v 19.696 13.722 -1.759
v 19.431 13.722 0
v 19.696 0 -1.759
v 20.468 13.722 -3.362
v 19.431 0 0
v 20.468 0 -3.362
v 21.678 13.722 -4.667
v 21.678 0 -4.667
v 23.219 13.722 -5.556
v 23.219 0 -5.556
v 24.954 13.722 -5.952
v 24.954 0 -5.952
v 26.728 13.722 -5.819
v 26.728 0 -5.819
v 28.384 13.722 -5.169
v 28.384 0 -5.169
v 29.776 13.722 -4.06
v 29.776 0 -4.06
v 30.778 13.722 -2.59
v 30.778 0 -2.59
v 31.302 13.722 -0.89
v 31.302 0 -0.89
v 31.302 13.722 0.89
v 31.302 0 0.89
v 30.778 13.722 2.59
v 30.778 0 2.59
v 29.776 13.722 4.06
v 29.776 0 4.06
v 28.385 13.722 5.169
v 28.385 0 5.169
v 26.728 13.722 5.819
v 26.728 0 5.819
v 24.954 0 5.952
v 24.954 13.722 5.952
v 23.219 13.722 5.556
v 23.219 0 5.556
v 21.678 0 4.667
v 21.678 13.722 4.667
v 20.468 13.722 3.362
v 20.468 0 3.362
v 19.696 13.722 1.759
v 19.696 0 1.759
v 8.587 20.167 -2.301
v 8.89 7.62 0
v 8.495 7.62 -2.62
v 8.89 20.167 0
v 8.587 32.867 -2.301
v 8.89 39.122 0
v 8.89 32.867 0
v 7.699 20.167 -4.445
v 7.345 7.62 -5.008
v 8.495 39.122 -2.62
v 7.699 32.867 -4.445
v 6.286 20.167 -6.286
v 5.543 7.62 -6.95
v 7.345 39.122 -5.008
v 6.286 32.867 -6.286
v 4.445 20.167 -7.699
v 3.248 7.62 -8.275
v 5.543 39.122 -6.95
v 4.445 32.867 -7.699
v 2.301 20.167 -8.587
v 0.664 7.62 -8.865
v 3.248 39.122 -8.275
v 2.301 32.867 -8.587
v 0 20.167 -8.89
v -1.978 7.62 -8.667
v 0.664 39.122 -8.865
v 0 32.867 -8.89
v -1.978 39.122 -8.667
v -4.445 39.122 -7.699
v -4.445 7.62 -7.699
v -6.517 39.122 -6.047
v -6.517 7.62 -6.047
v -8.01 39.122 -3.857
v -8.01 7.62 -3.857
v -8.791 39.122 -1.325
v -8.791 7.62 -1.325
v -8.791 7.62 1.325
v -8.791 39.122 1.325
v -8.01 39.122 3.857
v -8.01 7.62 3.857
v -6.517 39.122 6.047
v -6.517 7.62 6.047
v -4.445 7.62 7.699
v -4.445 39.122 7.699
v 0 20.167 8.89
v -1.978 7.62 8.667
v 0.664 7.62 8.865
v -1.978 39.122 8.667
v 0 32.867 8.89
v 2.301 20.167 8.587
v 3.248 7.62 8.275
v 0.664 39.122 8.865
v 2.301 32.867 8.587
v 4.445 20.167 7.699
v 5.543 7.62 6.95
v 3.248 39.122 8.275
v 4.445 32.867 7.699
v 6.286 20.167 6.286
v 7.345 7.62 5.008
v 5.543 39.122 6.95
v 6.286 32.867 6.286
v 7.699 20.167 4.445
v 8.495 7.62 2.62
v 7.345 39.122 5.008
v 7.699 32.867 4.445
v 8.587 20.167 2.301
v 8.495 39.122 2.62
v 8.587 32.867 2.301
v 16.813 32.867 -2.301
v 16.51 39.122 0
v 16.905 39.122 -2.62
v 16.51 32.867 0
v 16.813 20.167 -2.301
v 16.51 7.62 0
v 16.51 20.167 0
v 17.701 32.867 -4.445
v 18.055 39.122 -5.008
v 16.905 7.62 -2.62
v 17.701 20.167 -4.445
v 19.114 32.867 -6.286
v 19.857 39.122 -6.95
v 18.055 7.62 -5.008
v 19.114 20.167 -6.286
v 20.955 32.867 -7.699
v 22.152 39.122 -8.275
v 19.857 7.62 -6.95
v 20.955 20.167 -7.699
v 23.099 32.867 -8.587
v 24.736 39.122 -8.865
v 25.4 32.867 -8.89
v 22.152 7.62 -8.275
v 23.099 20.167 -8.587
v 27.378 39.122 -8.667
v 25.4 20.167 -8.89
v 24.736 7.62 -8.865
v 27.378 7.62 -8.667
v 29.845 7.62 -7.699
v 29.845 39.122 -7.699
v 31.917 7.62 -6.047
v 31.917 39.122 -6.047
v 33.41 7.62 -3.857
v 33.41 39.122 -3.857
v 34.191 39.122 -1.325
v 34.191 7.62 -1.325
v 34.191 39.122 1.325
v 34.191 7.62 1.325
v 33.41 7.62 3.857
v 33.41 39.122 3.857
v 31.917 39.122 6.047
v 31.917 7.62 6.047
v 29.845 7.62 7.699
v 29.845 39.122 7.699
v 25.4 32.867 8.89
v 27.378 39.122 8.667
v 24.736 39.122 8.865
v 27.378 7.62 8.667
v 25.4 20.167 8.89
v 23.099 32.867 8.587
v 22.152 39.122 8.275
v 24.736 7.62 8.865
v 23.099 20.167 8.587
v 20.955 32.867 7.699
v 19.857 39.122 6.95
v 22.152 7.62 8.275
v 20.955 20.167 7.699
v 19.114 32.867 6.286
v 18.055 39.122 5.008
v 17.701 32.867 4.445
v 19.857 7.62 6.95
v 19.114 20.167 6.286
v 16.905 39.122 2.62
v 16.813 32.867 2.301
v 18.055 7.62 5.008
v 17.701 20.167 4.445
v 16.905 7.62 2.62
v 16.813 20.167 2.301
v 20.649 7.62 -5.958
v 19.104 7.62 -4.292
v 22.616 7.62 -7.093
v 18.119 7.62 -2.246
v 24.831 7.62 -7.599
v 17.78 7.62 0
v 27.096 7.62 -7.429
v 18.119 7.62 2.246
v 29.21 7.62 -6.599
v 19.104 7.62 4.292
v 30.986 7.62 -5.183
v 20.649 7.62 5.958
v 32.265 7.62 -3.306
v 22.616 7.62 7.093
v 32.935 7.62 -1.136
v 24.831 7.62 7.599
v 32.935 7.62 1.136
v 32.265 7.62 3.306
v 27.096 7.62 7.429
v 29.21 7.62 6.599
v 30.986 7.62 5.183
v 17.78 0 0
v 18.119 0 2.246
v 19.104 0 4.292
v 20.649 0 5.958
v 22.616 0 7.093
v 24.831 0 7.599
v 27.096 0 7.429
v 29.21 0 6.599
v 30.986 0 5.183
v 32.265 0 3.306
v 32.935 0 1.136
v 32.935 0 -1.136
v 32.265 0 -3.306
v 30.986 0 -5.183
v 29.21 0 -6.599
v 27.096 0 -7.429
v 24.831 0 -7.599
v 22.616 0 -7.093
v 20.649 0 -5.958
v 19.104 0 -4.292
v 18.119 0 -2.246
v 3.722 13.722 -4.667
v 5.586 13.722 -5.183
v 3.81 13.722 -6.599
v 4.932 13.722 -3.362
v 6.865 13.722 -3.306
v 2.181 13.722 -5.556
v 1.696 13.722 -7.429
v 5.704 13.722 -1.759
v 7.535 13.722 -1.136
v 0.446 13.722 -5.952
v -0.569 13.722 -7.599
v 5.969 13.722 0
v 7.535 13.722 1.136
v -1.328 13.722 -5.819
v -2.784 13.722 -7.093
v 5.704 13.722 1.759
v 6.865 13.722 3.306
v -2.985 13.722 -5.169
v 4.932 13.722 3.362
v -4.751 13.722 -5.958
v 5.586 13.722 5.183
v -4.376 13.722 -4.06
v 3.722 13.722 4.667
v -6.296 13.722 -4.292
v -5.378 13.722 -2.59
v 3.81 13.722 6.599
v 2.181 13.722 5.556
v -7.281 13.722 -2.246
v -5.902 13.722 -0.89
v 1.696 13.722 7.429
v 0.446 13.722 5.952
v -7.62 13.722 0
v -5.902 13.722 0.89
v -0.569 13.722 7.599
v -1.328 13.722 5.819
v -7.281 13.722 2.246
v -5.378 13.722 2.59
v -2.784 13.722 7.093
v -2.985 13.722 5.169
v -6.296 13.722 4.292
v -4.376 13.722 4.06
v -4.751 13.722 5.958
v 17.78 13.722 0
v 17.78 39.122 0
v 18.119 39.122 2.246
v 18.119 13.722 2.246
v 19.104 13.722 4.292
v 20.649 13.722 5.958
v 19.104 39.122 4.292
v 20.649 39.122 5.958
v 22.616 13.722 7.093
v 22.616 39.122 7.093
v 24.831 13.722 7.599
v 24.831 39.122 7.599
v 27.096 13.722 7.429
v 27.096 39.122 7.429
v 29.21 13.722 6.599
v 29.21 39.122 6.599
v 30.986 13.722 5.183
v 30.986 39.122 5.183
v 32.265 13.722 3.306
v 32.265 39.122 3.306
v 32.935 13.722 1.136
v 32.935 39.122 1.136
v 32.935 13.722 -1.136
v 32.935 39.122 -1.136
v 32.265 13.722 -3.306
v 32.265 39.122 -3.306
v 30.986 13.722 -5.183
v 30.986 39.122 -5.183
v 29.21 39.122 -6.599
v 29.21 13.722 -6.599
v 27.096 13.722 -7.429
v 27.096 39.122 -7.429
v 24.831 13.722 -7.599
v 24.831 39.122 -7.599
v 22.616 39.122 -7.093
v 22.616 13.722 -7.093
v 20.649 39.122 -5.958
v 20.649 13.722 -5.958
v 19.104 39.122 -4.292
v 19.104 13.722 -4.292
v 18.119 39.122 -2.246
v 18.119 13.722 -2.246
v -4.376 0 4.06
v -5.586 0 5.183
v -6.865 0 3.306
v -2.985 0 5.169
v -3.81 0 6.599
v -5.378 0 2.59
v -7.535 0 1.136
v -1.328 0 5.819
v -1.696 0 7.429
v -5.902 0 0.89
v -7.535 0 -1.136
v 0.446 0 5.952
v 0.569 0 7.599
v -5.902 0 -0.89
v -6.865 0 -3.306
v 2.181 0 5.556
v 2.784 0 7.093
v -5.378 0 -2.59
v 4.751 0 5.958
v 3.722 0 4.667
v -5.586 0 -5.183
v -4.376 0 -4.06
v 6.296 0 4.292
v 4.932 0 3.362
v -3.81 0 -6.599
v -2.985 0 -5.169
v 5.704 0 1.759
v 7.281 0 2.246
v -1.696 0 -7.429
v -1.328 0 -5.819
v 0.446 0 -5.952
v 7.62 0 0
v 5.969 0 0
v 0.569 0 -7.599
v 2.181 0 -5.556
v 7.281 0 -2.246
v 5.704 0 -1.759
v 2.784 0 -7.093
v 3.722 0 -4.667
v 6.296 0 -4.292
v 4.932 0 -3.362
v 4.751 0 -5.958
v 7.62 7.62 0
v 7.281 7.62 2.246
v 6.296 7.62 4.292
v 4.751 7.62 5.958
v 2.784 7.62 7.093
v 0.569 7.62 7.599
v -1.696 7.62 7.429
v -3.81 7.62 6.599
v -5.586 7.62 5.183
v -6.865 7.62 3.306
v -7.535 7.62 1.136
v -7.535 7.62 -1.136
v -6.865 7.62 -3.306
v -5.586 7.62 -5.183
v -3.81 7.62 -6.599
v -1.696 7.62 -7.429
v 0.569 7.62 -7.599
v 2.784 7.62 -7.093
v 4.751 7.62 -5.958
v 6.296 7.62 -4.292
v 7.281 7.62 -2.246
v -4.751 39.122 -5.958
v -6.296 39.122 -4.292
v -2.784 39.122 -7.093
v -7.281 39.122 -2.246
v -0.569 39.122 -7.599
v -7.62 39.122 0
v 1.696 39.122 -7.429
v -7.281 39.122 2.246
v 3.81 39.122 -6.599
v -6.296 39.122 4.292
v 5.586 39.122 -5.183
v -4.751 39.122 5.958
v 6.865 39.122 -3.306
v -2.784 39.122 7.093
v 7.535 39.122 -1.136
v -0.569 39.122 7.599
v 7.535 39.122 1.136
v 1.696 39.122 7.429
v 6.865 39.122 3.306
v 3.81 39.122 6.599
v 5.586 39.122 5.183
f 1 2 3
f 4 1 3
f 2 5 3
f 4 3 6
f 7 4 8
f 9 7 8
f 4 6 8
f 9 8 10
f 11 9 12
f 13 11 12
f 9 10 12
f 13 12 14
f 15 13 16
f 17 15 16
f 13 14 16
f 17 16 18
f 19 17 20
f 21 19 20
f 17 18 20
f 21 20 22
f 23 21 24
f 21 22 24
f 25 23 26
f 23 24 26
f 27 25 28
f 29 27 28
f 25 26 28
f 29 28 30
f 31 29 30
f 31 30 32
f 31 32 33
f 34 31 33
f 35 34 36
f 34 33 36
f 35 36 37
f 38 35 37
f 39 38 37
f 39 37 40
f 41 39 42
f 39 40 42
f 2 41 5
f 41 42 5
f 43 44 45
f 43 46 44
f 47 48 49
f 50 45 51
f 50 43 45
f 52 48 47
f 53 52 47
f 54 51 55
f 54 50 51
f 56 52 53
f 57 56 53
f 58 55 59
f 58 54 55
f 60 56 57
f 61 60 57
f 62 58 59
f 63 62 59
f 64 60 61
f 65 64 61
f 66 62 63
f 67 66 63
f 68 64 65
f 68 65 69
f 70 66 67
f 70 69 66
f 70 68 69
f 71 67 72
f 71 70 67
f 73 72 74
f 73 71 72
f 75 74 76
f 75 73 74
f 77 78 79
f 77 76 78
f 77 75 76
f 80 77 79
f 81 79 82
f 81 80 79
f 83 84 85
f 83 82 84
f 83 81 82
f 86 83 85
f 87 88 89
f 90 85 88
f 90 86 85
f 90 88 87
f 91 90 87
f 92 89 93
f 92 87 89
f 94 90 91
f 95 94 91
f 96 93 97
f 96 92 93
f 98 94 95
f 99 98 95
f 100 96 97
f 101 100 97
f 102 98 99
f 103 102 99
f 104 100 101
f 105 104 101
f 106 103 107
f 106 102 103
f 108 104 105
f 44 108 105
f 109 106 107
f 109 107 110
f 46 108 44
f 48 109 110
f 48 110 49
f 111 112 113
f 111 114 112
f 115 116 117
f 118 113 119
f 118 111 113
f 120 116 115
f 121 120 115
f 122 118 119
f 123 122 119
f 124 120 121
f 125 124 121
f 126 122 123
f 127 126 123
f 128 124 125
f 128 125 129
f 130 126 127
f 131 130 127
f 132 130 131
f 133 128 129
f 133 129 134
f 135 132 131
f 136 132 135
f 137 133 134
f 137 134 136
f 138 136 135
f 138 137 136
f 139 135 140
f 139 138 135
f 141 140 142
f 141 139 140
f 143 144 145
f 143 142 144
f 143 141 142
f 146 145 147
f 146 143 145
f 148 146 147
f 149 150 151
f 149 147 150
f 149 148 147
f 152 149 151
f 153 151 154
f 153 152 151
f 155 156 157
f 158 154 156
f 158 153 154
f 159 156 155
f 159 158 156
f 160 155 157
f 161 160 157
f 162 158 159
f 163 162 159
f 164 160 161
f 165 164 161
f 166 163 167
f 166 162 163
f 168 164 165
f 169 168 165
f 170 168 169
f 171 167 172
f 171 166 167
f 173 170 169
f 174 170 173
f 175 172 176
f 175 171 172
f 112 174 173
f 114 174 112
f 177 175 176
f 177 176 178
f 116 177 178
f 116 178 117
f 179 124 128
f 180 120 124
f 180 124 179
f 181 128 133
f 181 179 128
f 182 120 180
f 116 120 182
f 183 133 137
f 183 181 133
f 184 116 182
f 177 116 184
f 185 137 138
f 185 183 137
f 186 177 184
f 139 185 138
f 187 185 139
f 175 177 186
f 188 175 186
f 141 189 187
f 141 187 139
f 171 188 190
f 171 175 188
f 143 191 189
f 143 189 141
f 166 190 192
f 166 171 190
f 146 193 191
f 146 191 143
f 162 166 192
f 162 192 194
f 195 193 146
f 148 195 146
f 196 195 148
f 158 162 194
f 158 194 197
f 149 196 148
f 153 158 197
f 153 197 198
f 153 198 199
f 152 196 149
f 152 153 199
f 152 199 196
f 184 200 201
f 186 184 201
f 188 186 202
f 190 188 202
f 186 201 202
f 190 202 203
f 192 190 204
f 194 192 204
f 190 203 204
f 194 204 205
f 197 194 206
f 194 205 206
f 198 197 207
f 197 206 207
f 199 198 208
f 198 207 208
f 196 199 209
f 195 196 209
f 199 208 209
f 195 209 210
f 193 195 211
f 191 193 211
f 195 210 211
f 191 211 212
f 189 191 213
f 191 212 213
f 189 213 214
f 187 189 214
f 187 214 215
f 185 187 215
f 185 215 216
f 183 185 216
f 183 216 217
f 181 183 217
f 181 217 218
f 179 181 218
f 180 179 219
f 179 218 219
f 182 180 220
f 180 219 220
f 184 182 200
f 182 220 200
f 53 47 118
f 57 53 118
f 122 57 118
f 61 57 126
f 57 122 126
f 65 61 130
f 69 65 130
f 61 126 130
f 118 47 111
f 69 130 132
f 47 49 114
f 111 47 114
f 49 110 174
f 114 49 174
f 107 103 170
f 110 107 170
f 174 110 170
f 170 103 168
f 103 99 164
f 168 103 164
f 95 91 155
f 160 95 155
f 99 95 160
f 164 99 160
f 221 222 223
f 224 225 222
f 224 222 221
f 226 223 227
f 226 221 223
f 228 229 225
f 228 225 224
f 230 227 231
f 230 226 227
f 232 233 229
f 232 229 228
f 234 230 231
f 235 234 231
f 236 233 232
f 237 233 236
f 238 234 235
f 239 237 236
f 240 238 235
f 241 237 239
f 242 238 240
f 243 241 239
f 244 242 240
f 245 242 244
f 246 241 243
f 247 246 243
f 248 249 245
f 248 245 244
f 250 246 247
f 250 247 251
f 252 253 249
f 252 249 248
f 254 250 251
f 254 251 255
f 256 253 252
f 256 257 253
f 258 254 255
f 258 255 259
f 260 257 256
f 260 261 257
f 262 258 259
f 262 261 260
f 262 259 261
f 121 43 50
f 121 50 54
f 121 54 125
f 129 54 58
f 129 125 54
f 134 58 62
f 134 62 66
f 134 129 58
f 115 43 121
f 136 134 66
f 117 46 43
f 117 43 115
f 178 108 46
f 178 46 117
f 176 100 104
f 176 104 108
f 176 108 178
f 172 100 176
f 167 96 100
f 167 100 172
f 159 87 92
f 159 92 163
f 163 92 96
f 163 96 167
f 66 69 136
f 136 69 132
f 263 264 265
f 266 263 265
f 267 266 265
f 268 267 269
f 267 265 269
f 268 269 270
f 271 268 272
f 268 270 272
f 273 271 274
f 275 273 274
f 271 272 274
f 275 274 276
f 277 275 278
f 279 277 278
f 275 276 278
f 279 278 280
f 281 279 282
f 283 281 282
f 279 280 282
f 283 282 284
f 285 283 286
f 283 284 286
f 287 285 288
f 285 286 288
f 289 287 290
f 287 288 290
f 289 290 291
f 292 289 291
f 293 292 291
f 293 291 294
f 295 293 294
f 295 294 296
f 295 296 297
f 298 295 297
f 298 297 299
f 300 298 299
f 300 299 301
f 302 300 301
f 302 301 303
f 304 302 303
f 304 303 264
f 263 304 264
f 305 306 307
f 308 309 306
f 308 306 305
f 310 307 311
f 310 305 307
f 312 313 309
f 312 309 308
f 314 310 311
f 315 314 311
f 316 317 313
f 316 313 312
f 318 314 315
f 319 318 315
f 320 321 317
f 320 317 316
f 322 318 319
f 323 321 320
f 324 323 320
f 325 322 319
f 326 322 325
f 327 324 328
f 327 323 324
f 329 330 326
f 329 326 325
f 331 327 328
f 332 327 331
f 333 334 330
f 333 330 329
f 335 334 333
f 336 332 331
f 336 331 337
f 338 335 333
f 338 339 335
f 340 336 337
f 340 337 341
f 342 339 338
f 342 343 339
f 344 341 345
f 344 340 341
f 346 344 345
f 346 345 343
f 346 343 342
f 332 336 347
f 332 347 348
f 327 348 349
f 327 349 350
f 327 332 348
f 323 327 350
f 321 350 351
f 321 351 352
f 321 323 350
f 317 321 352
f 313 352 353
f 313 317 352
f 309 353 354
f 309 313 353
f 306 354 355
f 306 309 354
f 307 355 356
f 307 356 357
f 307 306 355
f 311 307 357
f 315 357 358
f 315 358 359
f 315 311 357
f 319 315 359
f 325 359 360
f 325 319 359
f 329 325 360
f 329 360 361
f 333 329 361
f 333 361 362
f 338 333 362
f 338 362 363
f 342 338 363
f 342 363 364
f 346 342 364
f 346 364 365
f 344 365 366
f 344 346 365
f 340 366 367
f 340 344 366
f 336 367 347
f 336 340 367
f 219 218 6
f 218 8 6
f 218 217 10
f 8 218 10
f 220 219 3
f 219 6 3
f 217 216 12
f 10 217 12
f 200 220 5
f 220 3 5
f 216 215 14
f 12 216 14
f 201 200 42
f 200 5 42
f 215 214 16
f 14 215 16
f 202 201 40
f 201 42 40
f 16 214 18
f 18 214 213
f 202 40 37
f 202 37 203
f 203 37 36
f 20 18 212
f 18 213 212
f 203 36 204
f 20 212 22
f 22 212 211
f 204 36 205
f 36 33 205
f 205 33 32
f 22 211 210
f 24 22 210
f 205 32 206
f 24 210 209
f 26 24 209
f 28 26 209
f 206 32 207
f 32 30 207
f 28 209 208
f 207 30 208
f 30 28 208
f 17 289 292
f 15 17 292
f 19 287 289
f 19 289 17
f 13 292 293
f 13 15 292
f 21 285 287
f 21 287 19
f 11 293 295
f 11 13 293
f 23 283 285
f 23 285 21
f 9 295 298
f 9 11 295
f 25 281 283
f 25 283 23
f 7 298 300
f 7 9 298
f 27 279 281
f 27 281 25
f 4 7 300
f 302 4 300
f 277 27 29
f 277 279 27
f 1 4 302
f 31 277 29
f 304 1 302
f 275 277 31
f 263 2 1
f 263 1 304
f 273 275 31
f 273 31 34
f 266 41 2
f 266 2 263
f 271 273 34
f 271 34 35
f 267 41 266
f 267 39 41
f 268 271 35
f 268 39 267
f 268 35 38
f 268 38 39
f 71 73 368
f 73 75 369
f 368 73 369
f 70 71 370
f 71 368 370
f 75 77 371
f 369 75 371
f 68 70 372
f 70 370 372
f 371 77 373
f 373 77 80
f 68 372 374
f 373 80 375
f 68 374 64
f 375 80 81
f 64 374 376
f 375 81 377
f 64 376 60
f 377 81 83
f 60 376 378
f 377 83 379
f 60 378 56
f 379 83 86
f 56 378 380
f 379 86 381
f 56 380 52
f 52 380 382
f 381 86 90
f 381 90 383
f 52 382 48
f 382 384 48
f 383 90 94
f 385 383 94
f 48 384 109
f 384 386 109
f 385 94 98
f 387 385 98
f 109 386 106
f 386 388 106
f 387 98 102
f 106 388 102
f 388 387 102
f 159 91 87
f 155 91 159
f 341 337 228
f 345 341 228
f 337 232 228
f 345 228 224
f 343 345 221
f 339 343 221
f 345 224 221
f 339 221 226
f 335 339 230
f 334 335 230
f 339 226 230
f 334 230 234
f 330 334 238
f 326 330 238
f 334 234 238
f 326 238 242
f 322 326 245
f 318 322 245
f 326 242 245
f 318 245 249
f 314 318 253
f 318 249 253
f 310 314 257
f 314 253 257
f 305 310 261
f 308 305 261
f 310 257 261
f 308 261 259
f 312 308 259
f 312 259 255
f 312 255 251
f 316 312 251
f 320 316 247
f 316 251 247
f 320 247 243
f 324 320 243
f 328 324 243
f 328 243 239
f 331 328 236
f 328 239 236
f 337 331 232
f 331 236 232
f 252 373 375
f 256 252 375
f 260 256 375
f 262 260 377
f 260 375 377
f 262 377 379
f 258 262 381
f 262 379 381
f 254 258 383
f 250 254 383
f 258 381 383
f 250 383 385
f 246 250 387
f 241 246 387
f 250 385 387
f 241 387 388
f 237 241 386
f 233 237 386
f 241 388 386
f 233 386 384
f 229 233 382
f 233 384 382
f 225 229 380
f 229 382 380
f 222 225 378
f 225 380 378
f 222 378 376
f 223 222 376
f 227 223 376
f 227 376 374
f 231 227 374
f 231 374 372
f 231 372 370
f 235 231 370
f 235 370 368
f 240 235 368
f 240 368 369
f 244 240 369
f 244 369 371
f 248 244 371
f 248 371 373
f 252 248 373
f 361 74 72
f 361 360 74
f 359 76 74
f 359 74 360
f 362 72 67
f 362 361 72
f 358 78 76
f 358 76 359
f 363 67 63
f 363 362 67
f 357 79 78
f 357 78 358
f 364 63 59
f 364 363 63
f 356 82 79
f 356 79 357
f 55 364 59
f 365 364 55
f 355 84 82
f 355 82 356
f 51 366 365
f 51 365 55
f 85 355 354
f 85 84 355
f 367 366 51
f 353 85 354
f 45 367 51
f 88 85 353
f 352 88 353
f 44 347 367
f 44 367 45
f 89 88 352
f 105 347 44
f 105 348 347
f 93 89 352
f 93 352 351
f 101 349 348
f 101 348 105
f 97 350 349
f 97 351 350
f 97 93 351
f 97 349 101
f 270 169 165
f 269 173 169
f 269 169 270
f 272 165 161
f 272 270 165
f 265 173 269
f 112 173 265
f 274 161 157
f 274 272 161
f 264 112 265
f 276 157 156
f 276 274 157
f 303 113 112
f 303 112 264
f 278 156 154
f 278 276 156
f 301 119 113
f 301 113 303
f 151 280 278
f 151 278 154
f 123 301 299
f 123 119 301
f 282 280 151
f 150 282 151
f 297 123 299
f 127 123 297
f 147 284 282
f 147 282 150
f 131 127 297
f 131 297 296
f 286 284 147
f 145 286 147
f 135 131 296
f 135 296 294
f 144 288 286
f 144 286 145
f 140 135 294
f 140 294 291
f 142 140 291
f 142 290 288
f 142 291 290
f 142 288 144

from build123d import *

# Parameters (mm, degrees)
F1_R          = 8.89
F1_R_2        = 5.969
F3_R          = 8.89
F3_R_2        = 7.62
F4_DEPTH      = 7.62
F5_DEPTH      = 25.4
F5_DEPTH_BACK = 25.4
F6_R          = 7.62
F7_R          = 7.62
F8_DEPTH      = 25.4
F0_W          = 25.4
F0_H          = 12.7
F9_DEPTH      = 8.89
F9_DEPTH_BACK = 8.89
F10_DEPTH     = 25.4


with BuildPart() as f2:
    # F2: sweep along a path in F0
    with BuildLine(Plane.XY) as f2_path:
        Line((0, 0), (0, 68.940756))
        ThreePointArc((0, 68.940756), (12.7, 81.640756), (25.4, 68.940756))
        Line((25.4, 68.940756), (25.4, 0))
    # F1 (on Front) → F2 (sweep)
    with BuildSketch(Plane.XZ):
        Circle(F1_R)
        Circle(F1_R_2, mode=Mode.SUBTRACT)
    sweep(path=f2_path.line)

    # F3 (on face) → F4 (cut)
    with BuildSketch(Plane.XZ):
        Circle(F3_R)
        Circle(F3_R_2, mode=Mode.SUBTRACT)
        with BuildLine():
            ThreePointArc((34.29, 0), (25.4, 8.89), (16.51, 0))
            ThreePointArc((16.51, 0), (25.4, -8.89), (34.29, 0))
        make_face()
        with BuildLine():
            ThreePointArc((33.02, 0), (25.4, -7.62), (17.78, 0))
            ThreePointArc((17.78, 0), (25.4, 7.62), (33.02, 0))
        make_face(mode=Mode.SUBTRACT)
    extrude(amount=-F4_DEPTH, mode=Mode.SUBTRACT)

    # F0 (on Top) → F5 (cut, two sides)
    with BuildSketch(Plane.XY) as f5_sk:
        with BuildLine():
            Line((-11.195335, 39.121766), (0, 39.121766))
            Line((0, 39.121766), (0, 68.940756))
            ThreePointArc((0, 68.940756), (3.719744, 77.921012), (12.7, 81.640756))
            ThreePointArc((12.7, 81.640756), (21.680256, 77.921012), (25.4, 68.940756))
            Line((25.4, 68.940756), (25.4, 39.121766))
            Line((25.4, 39.121766), (39.424099, 39.121766))
            Line((39.424099, 39.121766), (39.424099, 94.536379))
            Line((39.424099, 94.536379), (-11.195335, 94.536379))
            Line((-11.195335, 94.536379), (-11.195335, 39.121766))
        make_face()
        with BuildLine():
            Line((0, 68.940756), (0, 39.121766))
            Line((0, 39.121766), (12.7, 39.121766))
            Line((12.7, 39.121766), (12.7, 81.640756))
            ThreePointArc((12.7, 81.640756), (3.719744, 77.921012), (0, 68.940756))
        make_face()
        with BuildLine():
            Line((12.7, 39.121766), (25.4, 39.121766))
            Line((25.4, 39.121766), (25.4, 68.940756))
            ThreePointArc((25.4, 68.940756), (21.680256, 77.921012), (12.7, 81.640756))
            Line((12.7, 81.640756), (12.7, 39.121766))
        make_face()
    extrude(amount=F5_DEPTH, mode=Mode.SUBTRACT)
    extrude(f5_sk.sketch, amount=-F5_DEPTH_BACK, mode=Mode.SUBTRACT)

    # F6 (on face) + F7 (on face) → F8 (cut)
    with BuildSketch(Plane(origin=(0, 39.121766, 0), x_dir=(-1, 0, 0), z_dir=(0, 1, 0))):
        Circle(F6_R)
    with BuildSketch(Plane(origin=(0, 39.121766, 0), x_dir=(-1, 0, 0), z_dir=(0, 1, 0))):
        with Locations((-25.4, 0)):
            Circle(F7_R)
    extrude(amount=-F8_DEPTH, mode=Mode.SUBTRACT)

    # F0 (on Top) → F9 (join, two sides)
    with BuildSketch(Plane.XY) as f9_sk:
        with Locations((12.7, 26.517263)):
            Rectangle(F0_W, F0_H)
    extrude(amount=F9_DEPTH)
    extrude(f9_sk.sketch, amount=-F9_DEPTH_BACK)

    # F7 (on face) + F6 (on face) → F10 (cut)
    with BuildSketch(Plane(origin=(0, 39.121766, 0), x_dir=(-1, 0, 0), z_dir=(0, 1, 0))):
        with Locations((-25.4, 0)):
            Circle(F7_R)
    with BuildSketch(Plane(origin=(0, 39.121766, 0), x_dir=(-1, 0, 0), z_dir=(0, 1, 0))):
        Circle(F6_R)
    extrude(amount=-F10_DEPTH, mode=Mode.SUBTRACT)


solid = f2.part
